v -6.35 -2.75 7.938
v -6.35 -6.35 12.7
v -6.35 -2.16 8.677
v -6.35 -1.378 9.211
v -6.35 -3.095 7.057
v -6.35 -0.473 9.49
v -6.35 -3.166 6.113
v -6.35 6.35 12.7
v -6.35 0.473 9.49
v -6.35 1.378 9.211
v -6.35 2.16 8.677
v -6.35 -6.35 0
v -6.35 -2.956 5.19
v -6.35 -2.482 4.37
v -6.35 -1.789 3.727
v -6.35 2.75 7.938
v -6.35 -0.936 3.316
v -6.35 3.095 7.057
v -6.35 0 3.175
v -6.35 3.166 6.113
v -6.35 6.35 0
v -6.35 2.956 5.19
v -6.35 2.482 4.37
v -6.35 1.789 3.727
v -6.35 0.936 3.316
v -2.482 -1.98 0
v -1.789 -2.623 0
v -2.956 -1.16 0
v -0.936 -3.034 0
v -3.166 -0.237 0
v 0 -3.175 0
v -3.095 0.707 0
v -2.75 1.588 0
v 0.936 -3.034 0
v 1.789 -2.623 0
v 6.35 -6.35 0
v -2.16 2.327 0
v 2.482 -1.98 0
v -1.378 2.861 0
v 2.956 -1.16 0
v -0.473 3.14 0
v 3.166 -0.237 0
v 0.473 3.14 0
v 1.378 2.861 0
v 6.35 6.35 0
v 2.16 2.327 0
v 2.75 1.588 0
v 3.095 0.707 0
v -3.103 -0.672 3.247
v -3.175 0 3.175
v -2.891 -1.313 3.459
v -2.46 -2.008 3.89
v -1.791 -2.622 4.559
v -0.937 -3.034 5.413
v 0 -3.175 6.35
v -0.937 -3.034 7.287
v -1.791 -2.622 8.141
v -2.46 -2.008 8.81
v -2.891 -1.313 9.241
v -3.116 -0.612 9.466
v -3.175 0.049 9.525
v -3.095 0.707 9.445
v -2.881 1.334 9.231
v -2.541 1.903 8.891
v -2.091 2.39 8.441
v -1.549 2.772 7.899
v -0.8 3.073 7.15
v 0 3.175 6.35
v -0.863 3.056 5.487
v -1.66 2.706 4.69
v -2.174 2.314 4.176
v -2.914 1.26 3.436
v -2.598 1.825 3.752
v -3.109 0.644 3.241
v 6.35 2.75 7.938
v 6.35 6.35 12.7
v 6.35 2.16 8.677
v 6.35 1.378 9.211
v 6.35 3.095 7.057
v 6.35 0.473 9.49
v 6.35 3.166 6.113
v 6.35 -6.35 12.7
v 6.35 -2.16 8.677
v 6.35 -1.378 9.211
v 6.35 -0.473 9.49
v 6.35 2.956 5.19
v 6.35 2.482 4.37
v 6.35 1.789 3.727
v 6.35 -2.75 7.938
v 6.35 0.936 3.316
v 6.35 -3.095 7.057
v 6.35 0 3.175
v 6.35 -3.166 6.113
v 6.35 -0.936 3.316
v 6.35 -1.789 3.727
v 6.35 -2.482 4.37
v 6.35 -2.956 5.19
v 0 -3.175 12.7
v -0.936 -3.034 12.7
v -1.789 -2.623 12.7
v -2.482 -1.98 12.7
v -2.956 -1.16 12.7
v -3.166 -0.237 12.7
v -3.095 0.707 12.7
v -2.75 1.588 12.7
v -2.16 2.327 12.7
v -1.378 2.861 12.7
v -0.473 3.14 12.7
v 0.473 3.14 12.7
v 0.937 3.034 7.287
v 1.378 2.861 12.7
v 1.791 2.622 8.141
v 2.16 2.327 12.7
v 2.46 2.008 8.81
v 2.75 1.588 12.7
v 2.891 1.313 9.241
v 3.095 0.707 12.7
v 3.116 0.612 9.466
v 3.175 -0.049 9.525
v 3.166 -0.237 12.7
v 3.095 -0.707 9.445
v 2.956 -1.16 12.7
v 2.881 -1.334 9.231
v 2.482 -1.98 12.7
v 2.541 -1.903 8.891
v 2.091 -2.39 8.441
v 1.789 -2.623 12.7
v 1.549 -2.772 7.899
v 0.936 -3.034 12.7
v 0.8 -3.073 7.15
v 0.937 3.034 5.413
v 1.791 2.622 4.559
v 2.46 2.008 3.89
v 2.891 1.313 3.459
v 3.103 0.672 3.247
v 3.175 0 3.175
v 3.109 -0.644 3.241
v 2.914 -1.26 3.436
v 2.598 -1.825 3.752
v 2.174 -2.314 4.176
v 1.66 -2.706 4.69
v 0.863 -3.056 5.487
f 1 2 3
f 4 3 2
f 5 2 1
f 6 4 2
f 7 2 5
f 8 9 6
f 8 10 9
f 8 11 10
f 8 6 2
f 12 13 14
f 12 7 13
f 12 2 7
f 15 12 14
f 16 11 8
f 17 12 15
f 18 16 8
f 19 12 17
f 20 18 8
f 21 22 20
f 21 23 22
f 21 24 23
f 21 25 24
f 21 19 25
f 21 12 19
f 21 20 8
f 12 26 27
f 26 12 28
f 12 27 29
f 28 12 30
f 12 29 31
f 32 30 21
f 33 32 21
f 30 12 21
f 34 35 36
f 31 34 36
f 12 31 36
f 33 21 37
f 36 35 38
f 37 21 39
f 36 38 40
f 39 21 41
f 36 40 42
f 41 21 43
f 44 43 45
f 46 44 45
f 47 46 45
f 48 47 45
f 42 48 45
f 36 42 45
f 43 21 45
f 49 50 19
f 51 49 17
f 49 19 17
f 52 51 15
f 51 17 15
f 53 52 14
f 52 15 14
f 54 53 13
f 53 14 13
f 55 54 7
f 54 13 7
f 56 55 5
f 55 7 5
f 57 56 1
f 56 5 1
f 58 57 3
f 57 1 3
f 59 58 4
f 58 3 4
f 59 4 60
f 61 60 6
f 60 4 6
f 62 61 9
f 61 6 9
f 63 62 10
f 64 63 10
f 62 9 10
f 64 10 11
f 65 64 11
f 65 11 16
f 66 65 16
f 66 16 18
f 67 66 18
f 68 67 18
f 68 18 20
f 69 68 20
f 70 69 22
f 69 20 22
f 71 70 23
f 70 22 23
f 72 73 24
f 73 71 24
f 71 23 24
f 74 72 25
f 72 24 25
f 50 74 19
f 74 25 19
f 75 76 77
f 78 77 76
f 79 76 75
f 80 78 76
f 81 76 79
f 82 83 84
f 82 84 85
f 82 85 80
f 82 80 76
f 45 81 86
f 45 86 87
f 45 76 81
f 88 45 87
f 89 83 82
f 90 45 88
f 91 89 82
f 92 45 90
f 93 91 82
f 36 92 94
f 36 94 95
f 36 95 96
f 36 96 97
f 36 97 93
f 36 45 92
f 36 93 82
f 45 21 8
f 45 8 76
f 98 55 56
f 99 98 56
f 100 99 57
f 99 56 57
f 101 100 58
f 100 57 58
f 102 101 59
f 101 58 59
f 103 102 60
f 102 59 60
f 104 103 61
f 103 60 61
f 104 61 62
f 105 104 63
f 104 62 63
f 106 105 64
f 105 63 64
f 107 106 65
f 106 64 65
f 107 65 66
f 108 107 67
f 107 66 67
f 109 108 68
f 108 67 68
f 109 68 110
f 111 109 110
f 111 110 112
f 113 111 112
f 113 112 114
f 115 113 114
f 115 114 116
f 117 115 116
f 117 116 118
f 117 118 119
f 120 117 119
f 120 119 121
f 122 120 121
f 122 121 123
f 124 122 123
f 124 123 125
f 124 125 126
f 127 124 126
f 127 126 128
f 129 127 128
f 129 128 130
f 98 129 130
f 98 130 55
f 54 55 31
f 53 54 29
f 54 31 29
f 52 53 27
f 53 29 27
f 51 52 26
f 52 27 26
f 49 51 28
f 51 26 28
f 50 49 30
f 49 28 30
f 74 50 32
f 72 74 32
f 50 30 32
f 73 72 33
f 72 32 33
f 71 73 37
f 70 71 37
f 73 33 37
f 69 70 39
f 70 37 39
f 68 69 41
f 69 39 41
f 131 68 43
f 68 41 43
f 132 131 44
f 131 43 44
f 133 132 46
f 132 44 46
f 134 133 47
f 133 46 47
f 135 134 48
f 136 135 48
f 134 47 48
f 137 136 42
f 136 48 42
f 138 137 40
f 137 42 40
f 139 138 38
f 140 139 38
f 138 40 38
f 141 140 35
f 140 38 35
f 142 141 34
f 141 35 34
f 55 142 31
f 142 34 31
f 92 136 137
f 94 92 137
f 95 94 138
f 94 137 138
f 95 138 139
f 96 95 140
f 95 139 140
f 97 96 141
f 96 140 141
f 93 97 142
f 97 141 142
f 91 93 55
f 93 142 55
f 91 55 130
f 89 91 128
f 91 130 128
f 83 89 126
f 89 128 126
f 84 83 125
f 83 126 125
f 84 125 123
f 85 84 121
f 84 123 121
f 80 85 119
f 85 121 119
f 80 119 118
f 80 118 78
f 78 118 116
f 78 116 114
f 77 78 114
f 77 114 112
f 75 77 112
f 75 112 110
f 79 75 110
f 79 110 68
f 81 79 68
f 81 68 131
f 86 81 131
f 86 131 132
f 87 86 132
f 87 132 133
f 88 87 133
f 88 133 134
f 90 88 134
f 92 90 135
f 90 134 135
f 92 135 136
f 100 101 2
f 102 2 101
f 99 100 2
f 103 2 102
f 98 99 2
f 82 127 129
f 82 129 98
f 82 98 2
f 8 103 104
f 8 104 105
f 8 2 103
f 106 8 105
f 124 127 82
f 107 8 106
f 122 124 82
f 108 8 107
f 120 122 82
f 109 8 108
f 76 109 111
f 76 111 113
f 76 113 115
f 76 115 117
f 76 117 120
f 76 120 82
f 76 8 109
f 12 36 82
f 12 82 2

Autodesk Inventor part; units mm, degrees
ref_plane "YZ Plane" through (0, 0, 0) normal (1, 0, 0) x (0, 1, 0)
ref_plane "XZ Plane" through (0, 0, 0) normal (0, 1, 0) x (-1, 0, 0)
ref_plane "XY Plane" through (0, 0, 0) normal (0, 0, 1) x (1, 0, 0)
sketch "Sketch1" plane through (0, 0, 0) normal (0, 0, 1) x (1, 0, 0)
  line L0 (-6.35, 6.35) -> (6.35, 6.35)
  line L1 (6.35, 6.35) -> (6.35, -6.35)
  line L2 (6.35, -6.35) -> (-6.35, -6.35)
  line L3 (-6.35, -6.35) -> (-6.35, 6.35)
  line L4 (-6.35, 6.35) -> (6.35, -6.35) construction
  line L5 (6.35, 6.35) -> (-6.35, -6.35) construction
  point P0 (0, 0)
  dimension "d0" = 12.7
  dimension "d1" = 12.7
extrude "Extrusion1" add sketch "Sketch1" along normal blind 12.7
sketch "Sketch4" plane through (0, 0, 12.7) normal (0, 0, 1) x (1, 0, 0)
  point P0 (0, 0)
hole "Hole1" at (0, 0, 12.7) direction (0, 0, -1) diameter 6.35 end through all
sketch "Sketch5" plane through (6.35, -6.35, 0) normal (1, 0, 0) x (0, 0, -1)
  line L0 (-12.7, 12.7) -> (0, 0)
  point P0 (0, 6.35)
  point P1 (-6.35, 6.35)
hole "Hole2" at (6.35, 0, 6.35) direction (-1, 0, 0) diameter 6.35 end through all
equation "\"d0\" = d1"
properties part number "Connector" material "Nylon 6/6"
